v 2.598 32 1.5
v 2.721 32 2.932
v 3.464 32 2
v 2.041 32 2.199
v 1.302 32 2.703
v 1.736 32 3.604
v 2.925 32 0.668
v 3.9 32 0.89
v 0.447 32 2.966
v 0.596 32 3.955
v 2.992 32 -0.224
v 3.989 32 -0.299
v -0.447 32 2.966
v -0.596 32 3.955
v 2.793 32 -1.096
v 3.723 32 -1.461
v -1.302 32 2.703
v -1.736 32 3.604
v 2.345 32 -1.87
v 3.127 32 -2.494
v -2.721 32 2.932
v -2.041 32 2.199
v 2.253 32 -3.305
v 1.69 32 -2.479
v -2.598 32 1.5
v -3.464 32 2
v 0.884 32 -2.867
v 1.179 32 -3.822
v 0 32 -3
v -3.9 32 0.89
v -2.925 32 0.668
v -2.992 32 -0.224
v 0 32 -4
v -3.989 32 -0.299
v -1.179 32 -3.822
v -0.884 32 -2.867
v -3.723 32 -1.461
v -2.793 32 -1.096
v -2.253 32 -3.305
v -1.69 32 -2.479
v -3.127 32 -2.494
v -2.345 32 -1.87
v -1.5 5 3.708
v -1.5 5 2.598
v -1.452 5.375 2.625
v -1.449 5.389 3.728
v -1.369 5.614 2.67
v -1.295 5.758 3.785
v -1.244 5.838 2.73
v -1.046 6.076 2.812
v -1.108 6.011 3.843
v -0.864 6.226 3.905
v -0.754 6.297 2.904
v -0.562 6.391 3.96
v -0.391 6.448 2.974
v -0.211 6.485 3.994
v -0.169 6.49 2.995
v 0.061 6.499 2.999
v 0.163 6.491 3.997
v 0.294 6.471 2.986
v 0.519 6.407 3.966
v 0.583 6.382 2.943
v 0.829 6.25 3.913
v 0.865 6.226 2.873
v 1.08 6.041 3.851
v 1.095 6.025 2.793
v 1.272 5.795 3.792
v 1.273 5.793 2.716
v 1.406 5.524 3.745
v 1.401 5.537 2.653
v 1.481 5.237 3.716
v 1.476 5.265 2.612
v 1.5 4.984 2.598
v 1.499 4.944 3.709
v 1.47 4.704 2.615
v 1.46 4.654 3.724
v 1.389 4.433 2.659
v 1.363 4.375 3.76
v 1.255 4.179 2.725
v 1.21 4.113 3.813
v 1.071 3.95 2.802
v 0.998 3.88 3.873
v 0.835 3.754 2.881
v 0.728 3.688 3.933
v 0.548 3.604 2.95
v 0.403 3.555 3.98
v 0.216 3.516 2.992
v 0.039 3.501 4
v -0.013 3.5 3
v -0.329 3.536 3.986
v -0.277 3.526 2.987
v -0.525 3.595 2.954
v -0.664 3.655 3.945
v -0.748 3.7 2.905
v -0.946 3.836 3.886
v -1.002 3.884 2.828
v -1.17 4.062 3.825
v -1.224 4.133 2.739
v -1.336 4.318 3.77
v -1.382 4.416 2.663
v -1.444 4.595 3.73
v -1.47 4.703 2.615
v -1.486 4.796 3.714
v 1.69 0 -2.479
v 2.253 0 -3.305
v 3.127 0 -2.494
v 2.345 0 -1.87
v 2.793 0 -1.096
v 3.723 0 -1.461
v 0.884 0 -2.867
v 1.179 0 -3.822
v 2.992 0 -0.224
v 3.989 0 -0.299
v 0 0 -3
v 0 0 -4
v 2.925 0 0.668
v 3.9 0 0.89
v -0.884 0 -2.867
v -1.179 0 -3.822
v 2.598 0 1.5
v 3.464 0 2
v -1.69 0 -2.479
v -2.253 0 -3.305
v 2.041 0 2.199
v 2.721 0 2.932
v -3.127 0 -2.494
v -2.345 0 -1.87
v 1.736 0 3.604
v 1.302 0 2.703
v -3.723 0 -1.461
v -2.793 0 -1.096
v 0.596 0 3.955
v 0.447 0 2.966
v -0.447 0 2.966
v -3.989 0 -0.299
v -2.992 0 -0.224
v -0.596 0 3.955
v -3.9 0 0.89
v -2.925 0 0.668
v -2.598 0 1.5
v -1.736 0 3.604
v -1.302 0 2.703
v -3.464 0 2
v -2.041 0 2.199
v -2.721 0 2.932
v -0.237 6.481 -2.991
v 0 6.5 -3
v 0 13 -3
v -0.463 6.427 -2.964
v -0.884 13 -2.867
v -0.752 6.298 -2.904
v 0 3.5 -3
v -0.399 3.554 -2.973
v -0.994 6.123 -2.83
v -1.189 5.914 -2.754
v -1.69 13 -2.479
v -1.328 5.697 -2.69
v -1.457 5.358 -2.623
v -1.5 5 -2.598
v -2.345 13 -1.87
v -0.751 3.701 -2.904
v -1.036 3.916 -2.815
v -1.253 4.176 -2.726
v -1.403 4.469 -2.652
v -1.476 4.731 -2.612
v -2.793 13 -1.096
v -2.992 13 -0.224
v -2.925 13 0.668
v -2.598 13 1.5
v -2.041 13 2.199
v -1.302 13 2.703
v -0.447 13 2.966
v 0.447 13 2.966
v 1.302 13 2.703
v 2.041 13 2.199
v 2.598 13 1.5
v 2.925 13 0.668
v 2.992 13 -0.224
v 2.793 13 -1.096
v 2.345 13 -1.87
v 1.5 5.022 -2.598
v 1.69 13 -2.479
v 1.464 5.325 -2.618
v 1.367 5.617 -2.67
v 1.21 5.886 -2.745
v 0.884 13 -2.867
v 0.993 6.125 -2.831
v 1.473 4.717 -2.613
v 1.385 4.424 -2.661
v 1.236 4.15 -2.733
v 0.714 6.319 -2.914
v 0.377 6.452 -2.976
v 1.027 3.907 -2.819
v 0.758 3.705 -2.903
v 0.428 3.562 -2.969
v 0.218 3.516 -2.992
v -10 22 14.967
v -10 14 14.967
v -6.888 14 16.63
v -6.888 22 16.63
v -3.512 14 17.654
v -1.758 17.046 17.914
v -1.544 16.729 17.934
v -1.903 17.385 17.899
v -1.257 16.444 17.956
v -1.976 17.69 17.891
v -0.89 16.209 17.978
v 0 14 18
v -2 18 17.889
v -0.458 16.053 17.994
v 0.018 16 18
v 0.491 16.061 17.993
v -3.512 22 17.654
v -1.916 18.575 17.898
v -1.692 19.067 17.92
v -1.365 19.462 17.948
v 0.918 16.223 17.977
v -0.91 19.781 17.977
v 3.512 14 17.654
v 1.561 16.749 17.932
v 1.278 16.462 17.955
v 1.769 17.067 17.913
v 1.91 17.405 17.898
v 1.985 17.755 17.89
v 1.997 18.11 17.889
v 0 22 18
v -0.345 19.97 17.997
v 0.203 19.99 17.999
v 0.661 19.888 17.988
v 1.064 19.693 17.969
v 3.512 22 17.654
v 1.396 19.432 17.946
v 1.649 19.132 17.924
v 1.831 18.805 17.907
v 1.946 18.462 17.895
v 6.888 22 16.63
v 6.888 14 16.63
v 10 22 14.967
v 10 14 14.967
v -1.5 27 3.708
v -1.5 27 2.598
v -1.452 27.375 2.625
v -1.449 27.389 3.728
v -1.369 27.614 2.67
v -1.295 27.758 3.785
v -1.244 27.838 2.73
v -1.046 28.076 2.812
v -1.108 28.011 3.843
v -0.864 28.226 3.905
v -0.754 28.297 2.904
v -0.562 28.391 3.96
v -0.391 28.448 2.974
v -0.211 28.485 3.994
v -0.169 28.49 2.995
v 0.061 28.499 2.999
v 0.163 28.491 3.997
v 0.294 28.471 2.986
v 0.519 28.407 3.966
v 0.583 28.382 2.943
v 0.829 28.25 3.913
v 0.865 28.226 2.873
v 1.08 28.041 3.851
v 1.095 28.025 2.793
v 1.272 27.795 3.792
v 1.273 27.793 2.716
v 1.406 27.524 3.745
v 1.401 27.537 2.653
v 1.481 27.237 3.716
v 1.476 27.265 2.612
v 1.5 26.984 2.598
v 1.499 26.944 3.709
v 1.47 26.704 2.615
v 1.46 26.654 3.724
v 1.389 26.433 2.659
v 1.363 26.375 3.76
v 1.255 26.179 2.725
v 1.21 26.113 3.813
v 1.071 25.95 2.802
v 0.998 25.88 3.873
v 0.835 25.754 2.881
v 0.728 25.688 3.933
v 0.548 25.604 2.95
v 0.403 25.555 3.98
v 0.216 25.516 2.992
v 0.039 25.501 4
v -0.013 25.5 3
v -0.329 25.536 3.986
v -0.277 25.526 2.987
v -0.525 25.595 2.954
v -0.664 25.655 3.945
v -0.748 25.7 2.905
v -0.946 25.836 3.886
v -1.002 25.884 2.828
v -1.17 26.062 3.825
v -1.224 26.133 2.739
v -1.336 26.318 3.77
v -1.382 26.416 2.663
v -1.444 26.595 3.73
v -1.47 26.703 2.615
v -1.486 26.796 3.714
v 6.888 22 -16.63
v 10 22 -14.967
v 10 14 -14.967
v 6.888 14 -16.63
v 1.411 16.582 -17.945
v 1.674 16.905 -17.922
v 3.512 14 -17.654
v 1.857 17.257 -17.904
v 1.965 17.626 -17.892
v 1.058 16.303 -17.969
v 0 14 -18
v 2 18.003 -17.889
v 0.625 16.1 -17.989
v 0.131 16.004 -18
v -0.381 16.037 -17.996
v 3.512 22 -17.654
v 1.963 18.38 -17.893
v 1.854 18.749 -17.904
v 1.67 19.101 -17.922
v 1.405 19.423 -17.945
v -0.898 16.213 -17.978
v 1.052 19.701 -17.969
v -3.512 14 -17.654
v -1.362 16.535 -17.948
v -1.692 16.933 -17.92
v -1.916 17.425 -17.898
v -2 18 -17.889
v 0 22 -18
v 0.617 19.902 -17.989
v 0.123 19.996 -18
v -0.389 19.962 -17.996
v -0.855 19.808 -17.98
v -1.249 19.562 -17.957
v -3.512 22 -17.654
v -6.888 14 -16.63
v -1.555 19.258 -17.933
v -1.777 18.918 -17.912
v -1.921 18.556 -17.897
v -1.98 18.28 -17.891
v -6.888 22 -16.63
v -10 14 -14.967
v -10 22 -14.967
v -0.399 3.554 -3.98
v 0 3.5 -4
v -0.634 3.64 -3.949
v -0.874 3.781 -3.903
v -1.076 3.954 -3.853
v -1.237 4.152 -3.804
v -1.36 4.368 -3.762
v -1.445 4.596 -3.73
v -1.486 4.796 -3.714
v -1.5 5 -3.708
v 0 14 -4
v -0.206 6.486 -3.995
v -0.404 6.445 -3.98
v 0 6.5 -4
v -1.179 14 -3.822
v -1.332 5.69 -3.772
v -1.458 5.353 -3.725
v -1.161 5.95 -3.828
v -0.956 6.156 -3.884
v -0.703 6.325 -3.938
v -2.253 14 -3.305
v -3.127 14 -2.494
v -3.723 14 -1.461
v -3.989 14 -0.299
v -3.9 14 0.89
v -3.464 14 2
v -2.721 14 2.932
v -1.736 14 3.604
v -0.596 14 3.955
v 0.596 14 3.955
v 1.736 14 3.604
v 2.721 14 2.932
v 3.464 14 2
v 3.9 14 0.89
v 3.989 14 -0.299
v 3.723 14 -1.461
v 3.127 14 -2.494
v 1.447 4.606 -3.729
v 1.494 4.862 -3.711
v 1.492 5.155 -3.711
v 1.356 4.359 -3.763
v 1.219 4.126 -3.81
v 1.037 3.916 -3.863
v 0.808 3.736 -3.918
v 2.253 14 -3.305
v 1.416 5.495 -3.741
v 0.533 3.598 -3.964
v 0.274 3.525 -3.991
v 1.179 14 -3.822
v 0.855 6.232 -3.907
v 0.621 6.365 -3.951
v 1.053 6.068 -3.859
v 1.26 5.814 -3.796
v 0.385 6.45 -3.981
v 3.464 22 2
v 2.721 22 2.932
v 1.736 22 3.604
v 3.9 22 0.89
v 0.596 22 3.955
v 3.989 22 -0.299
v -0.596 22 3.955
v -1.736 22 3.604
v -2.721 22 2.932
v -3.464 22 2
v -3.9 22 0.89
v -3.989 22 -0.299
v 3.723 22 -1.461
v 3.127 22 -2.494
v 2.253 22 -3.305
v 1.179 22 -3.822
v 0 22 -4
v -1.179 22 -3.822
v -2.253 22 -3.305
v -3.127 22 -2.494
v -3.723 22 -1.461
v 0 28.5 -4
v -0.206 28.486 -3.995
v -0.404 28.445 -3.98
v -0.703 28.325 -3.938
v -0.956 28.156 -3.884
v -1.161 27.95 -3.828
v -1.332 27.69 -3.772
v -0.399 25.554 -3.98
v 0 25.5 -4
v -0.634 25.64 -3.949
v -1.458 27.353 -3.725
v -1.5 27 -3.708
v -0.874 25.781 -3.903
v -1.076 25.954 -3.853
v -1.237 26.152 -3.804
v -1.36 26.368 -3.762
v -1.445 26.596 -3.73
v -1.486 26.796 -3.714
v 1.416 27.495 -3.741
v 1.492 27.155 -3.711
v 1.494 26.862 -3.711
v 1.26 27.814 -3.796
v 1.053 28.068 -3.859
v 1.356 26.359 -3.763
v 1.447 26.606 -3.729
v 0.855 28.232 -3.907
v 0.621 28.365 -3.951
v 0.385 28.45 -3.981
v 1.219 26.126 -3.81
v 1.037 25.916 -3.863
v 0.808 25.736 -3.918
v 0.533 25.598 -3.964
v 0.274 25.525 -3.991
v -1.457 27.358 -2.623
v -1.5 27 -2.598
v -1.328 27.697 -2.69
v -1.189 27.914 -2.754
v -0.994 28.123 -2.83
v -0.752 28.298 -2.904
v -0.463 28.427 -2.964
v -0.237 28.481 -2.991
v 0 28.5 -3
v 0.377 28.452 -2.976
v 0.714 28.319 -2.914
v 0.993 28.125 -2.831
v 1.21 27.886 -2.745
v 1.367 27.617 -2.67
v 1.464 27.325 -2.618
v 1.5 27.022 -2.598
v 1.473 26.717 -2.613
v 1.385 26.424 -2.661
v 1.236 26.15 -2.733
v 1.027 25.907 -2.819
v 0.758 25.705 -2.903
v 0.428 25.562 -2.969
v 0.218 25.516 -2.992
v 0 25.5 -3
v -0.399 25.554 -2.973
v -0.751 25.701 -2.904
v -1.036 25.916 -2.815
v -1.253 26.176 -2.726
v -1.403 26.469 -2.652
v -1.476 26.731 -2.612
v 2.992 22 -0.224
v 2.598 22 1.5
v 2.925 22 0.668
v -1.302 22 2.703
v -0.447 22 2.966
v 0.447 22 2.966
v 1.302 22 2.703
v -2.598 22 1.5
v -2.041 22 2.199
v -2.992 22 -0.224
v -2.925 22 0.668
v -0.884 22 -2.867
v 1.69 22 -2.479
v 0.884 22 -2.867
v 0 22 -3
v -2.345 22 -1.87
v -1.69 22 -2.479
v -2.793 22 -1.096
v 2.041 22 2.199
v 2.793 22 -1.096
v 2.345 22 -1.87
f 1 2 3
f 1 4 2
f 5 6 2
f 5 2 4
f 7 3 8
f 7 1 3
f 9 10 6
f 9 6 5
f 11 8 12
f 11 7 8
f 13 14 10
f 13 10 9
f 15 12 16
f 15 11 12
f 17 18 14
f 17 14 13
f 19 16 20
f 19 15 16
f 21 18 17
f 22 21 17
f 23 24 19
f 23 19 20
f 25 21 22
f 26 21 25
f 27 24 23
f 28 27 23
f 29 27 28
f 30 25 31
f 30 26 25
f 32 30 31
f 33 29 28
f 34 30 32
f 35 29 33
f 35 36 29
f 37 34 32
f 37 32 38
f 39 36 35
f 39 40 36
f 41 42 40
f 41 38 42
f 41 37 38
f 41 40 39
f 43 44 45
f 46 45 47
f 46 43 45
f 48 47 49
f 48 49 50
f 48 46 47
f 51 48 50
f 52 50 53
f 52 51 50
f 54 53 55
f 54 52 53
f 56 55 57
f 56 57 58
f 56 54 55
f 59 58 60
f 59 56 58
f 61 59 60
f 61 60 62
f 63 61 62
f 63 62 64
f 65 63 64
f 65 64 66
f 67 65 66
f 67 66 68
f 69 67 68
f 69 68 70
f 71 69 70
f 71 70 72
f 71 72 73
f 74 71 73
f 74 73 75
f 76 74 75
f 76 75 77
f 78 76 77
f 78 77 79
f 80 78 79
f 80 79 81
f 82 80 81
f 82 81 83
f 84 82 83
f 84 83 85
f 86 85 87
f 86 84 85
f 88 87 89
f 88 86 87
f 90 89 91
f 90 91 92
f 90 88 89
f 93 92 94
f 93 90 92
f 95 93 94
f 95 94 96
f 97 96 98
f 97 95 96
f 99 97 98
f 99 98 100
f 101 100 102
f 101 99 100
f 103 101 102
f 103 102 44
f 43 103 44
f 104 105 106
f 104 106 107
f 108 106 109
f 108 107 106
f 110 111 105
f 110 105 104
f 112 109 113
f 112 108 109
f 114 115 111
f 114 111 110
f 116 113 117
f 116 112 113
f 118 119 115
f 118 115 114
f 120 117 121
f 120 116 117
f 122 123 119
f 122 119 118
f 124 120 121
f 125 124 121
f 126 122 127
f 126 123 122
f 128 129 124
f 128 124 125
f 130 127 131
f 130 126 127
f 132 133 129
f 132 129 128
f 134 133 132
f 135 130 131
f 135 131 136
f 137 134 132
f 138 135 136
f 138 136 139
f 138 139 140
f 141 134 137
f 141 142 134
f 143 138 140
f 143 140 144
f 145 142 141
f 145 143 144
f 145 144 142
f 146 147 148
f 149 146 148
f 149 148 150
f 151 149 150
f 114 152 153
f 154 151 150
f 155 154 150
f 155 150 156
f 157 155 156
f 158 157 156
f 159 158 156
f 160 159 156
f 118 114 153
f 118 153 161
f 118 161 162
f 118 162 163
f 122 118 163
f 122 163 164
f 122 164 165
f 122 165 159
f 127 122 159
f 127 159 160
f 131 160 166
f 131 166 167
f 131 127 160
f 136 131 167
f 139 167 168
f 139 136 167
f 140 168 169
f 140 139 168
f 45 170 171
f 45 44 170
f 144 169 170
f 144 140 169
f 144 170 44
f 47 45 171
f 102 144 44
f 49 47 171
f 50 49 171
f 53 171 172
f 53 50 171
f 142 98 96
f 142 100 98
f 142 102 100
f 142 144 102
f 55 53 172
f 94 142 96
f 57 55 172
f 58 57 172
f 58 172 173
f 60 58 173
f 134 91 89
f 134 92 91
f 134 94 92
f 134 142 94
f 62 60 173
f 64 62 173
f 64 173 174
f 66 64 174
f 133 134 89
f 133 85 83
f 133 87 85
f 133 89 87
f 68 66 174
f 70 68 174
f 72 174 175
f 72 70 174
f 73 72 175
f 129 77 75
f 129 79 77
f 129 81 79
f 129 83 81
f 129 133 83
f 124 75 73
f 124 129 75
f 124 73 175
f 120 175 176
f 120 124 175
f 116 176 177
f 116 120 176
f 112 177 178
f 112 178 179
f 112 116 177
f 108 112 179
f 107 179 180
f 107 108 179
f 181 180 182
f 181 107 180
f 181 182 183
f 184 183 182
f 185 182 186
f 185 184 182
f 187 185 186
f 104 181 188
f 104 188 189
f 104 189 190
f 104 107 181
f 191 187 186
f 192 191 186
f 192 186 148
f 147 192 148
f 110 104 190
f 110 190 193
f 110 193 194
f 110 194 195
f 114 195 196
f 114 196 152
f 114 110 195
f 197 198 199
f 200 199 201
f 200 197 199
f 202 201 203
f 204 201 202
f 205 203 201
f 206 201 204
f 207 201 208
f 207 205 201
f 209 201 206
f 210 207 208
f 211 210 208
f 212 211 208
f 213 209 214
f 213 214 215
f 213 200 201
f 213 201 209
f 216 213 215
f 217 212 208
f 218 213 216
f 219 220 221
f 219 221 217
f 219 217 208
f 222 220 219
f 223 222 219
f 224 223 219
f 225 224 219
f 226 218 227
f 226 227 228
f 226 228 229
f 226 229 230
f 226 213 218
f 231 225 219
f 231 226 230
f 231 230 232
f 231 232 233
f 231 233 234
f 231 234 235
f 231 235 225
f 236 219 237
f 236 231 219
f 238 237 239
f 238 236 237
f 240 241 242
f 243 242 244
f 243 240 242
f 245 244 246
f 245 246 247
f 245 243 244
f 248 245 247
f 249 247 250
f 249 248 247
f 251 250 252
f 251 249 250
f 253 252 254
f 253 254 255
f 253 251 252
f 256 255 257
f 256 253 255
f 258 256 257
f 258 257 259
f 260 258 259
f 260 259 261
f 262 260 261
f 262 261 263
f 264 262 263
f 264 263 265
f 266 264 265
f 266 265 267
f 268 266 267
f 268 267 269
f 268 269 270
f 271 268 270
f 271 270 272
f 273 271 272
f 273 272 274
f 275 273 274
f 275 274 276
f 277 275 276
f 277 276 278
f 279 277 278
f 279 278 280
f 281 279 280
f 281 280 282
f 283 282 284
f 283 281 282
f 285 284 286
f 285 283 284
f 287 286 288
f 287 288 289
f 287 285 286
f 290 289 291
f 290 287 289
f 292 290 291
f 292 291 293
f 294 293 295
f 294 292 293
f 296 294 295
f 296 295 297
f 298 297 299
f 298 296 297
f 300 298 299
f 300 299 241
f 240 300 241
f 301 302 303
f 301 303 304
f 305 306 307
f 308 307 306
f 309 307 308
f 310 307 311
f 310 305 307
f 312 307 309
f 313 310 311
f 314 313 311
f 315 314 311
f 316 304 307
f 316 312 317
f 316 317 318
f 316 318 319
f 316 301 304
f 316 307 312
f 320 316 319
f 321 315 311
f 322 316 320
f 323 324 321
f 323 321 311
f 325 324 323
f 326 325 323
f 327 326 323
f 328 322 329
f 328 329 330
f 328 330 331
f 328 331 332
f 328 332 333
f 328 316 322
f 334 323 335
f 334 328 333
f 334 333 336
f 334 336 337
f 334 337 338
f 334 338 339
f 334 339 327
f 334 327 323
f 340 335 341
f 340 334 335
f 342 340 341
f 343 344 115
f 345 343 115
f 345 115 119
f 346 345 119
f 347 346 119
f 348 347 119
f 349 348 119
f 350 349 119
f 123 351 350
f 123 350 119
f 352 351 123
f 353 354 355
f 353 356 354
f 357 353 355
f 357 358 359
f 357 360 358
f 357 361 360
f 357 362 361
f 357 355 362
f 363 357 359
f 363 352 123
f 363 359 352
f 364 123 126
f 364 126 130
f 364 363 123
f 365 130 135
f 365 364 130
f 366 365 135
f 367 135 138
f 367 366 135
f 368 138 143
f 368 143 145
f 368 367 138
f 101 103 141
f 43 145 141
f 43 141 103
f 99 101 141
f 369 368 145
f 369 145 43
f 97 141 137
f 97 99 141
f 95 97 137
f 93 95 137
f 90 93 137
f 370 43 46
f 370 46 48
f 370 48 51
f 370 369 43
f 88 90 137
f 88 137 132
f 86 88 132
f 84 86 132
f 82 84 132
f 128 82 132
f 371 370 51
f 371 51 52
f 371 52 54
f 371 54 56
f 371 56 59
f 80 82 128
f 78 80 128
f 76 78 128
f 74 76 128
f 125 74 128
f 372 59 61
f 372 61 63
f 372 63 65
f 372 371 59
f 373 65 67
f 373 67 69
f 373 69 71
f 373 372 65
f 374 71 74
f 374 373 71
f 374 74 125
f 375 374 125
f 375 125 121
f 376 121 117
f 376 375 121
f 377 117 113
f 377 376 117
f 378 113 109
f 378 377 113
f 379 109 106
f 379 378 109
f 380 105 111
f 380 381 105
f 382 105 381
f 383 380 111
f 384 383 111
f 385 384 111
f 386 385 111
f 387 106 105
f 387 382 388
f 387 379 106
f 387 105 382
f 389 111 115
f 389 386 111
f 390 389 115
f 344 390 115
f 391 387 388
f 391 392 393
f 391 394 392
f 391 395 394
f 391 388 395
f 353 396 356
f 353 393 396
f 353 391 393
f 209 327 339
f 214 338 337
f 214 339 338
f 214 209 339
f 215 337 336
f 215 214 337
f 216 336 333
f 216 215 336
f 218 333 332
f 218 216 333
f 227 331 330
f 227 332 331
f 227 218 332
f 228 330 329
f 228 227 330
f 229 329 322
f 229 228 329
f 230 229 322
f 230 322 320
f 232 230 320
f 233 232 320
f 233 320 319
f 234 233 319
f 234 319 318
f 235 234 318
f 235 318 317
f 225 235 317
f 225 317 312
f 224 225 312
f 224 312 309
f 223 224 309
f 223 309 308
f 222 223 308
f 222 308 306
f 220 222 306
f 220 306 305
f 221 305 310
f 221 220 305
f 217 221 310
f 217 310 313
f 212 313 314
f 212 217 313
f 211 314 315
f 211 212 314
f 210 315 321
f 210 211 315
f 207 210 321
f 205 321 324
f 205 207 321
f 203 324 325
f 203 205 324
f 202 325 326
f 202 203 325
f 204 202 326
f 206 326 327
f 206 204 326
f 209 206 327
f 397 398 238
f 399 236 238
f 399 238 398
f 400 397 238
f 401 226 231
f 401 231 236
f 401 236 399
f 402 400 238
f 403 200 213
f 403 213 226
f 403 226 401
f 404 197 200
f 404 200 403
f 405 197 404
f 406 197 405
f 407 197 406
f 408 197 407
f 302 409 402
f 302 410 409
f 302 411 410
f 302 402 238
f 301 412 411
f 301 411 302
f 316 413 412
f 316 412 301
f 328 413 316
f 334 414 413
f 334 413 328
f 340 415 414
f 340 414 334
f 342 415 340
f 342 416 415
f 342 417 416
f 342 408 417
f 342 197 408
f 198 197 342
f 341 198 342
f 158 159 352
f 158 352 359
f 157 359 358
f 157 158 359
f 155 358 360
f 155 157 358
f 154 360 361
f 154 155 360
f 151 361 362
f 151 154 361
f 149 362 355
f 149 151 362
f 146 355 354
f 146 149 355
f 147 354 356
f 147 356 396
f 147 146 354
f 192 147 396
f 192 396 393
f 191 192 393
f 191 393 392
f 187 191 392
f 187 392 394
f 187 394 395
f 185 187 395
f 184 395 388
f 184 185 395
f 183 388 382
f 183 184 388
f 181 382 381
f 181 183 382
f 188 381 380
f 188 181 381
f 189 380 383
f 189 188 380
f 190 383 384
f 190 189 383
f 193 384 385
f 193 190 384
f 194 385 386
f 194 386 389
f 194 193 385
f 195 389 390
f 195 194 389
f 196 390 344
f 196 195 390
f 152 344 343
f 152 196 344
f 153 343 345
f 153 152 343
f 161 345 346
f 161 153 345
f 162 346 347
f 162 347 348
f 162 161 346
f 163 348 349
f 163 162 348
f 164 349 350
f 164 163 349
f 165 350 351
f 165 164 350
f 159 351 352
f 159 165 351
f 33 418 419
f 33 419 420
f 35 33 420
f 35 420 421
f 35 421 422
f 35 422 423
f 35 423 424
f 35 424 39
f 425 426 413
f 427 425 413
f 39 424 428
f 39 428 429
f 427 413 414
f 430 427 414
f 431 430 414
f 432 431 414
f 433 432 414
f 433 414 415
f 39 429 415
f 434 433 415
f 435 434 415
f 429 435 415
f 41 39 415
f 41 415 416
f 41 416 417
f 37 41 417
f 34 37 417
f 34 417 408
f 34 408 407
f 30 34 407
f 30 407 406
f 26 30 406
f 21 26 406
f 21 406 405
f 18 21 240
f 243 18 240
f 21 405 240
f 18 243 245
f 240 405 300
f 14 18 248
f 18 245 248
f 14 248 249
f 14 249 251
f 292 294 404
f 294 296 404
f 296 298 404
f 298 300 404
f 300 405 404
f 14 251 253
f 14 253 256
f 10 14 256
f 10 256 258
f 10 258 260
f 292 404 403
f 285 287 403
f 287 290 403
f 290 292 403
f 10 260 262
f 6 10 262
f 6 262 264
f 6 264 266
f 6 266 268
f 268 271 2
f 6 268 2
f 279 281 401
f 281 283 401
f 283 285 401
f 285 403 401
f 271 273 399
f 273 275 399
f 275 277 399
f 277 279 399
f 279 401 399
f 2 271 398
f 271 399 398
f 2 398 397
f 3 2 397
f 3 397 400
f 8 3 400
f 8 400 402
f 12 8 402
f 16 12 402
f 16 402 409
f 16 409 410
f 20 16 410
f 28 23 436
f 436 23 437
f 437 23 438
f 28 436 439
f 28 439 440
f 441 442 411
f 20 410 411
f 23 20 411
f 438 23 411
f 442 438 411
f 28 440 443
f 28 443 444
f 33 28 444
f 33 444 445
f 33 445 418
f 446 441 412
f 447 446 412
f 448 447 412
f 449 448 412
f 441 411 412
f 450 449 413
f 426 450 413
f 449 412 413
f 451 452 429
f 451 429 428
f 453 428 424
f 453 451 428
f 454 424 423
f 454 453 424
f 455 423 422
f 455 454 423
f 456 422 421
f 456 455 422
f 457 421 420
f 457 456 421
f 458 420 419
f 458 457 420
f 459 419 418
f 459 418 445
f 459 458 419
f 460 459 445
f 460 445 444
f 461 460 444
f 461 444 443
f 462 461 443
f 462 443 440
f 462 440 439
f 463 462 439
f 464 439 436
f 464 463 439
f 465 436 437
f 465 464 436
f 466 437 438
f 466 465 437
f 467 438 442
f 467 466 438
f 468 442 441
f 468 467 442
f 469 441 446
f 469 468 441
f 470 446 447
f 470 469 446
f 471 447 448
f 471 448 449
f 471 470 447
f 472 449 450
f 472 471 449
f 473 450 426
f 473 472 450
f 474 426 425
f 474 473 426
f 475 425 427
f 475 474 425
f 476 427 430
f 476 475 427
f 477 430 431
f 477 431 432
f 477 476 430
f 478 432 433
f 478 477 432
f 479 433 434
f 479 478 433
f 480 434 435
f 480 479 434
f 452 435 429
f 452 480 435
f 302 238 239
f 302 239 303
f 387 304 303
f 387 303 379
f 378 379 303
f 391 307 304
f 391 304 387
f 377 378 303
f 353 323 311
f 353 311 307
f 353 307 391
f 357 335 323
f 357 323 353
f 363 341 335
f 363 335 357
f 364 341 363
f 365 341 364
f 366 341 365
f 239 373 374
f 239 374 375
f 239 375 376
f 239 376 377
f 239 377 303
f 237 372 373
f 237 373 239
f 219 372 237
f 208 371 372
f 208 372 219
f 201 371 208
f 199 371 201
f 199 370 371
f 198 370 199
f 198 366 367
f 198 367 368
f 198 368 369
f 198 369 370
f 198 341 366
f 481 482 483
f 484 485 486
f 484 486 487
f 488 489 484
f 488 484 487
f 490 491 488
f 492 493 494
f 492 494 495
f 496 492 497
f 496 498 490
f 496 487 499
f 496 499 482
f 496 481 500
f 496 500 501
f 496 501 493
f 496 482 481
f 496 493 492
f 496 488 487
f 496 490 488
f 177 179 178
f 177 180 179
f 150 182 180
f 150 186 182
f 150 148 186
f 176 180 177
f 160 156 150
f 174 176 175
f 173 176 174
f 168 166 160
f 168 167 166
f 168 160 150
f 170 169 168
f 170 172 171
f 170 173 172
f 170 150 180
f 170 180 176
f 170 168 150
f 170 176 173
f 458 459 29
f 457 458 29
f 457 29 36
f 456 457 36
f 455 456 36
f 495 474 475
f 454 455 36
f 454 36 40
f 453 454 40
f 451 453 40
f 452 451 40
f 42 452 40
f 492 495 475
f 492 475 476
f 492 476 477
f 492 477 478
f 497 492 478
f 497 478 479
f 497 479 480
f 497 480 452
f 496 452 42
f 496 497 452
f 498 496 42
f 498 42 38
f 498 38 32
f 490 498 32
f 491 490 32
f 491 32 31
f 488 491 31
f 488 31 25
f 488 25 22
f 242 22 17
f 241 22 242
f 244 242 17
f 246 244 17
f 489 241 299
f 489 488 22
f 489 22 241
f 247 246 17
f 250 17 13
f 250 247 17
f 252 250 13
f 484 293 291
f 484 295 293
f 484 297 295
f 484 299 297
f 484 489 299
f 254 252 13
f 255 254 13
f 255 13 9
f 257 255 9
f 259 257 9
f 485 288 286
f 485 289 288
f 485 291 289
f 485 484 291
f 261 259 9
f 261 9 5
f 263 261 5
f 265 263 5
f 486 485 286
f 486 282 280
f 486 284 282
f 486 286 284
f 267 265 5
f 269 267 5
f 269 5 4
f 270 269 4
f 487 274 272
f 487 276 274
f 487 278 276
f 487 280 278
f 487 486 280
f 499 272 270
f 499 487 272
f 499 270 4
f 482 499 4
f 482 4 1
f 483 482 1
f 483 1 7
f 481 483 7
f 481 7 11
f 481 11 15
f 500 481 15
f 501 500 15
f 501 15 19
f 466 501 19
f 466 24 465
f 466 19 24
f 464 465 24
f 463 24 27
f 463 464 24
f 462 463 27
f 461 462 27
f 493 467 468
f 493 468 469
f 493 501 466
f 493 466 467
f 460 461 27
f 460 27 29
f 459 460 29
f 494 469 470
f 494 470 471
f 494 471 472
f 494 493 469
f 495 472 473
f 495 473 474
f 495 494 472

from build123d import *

# Parameters (mm, degrees)
SKETCH2_R               = 4
SKETCH2_R_2             = 3
BOSS_EXTRUDE1_DEPTH     = 10
CUT_EXTRUDE1_DEPTH      = 43.801869118
CUT_EXTRUDE1_DEPTH_BACK = 43.801869118
SKETCH3_R               = 1.5
SKETCH3_R_2             = 2
SKETCH4_W               = 13
SKETCH4_H               = 38
CUT_EXTRUDE2_DEPTH      = 10


with BuildPart() as part:
    # Sketch1 → Revolve1 (revolve)
    with BuildSketch(Plane.XY, mode=Mode.PRIVATE) as revolve1_sk:
        Polygon((3, 0), (4, 0), (4, 14), (18, 14), (18, 22), (0, 22), (0, 13), (3, 13), align=None)
    revolve(revolve1_sk.sketch.rotate(Axis((0, 0, 0), (0, 1, 0)), 90), axis=Axis((0, 0, 0), (0, 1, 0)))

    # Sketch2 → Boss-Extrude1 (add)
    with BuildSketch(Plane(origin=(0, 22, 0), x_dir=(1, 0, 0), z_dir=(0, 1, 0))):
        with Locations(Location((0, 0, 0), (0, 0, 90))):
            Circle(SKETCH2_R)
        with Locations(Location((0, 0, 0), (0, 0, 90))):
            Circle(SKETCH2_R_2, mode=Mode.SUBTRACT)
    extrude(amount=BOSS_EXTRUDE1_DEPTH)

    # Sketch3 → Cut-Extrude1 (cut, two sides: drawn at the far end of the back side and taken through both)
    with BuildSketch(Plane(origin=(0, 0, -4), x_dir=(-1, 0, 0), z_dir=(0, 0, -1)).offset(-CUT_EXTRUDE1_DEPTH_BACK)):
        with Locations((0, 5)):
            Circle(SKETCH3_R)
        with Locations((0, 27)):
            Circle(SKETCH3_R)
        with Locations((0, 18)):
            Circle(SKETCH3_R_2)
    extrude(amount=CUT_EXTRUDE1_DEPTH + CUT_EXTRUDE1_DEPTH_BACK, mode=Mode.SUBTRACT)

    # Sketch4 → Cut-Extrude2 (cut)
    with BuildSketch(Plane(origin=(0, 22, 0), x_dir=(1, 0, 0), z_dir=(0, 1, 0))):
        with Locations((-16.5, 0)):
            Rectangle(SKETCH4_W, SKETCH4_H)
        with Locations((16.5, 0)):
            Rectangle(SKETCH4_W, SKETCH4_H)
    extrude(amount=-CUT_EXTRUDE2_DEPTH, mode=Mode.SUBTRACT)


solid = part.part
